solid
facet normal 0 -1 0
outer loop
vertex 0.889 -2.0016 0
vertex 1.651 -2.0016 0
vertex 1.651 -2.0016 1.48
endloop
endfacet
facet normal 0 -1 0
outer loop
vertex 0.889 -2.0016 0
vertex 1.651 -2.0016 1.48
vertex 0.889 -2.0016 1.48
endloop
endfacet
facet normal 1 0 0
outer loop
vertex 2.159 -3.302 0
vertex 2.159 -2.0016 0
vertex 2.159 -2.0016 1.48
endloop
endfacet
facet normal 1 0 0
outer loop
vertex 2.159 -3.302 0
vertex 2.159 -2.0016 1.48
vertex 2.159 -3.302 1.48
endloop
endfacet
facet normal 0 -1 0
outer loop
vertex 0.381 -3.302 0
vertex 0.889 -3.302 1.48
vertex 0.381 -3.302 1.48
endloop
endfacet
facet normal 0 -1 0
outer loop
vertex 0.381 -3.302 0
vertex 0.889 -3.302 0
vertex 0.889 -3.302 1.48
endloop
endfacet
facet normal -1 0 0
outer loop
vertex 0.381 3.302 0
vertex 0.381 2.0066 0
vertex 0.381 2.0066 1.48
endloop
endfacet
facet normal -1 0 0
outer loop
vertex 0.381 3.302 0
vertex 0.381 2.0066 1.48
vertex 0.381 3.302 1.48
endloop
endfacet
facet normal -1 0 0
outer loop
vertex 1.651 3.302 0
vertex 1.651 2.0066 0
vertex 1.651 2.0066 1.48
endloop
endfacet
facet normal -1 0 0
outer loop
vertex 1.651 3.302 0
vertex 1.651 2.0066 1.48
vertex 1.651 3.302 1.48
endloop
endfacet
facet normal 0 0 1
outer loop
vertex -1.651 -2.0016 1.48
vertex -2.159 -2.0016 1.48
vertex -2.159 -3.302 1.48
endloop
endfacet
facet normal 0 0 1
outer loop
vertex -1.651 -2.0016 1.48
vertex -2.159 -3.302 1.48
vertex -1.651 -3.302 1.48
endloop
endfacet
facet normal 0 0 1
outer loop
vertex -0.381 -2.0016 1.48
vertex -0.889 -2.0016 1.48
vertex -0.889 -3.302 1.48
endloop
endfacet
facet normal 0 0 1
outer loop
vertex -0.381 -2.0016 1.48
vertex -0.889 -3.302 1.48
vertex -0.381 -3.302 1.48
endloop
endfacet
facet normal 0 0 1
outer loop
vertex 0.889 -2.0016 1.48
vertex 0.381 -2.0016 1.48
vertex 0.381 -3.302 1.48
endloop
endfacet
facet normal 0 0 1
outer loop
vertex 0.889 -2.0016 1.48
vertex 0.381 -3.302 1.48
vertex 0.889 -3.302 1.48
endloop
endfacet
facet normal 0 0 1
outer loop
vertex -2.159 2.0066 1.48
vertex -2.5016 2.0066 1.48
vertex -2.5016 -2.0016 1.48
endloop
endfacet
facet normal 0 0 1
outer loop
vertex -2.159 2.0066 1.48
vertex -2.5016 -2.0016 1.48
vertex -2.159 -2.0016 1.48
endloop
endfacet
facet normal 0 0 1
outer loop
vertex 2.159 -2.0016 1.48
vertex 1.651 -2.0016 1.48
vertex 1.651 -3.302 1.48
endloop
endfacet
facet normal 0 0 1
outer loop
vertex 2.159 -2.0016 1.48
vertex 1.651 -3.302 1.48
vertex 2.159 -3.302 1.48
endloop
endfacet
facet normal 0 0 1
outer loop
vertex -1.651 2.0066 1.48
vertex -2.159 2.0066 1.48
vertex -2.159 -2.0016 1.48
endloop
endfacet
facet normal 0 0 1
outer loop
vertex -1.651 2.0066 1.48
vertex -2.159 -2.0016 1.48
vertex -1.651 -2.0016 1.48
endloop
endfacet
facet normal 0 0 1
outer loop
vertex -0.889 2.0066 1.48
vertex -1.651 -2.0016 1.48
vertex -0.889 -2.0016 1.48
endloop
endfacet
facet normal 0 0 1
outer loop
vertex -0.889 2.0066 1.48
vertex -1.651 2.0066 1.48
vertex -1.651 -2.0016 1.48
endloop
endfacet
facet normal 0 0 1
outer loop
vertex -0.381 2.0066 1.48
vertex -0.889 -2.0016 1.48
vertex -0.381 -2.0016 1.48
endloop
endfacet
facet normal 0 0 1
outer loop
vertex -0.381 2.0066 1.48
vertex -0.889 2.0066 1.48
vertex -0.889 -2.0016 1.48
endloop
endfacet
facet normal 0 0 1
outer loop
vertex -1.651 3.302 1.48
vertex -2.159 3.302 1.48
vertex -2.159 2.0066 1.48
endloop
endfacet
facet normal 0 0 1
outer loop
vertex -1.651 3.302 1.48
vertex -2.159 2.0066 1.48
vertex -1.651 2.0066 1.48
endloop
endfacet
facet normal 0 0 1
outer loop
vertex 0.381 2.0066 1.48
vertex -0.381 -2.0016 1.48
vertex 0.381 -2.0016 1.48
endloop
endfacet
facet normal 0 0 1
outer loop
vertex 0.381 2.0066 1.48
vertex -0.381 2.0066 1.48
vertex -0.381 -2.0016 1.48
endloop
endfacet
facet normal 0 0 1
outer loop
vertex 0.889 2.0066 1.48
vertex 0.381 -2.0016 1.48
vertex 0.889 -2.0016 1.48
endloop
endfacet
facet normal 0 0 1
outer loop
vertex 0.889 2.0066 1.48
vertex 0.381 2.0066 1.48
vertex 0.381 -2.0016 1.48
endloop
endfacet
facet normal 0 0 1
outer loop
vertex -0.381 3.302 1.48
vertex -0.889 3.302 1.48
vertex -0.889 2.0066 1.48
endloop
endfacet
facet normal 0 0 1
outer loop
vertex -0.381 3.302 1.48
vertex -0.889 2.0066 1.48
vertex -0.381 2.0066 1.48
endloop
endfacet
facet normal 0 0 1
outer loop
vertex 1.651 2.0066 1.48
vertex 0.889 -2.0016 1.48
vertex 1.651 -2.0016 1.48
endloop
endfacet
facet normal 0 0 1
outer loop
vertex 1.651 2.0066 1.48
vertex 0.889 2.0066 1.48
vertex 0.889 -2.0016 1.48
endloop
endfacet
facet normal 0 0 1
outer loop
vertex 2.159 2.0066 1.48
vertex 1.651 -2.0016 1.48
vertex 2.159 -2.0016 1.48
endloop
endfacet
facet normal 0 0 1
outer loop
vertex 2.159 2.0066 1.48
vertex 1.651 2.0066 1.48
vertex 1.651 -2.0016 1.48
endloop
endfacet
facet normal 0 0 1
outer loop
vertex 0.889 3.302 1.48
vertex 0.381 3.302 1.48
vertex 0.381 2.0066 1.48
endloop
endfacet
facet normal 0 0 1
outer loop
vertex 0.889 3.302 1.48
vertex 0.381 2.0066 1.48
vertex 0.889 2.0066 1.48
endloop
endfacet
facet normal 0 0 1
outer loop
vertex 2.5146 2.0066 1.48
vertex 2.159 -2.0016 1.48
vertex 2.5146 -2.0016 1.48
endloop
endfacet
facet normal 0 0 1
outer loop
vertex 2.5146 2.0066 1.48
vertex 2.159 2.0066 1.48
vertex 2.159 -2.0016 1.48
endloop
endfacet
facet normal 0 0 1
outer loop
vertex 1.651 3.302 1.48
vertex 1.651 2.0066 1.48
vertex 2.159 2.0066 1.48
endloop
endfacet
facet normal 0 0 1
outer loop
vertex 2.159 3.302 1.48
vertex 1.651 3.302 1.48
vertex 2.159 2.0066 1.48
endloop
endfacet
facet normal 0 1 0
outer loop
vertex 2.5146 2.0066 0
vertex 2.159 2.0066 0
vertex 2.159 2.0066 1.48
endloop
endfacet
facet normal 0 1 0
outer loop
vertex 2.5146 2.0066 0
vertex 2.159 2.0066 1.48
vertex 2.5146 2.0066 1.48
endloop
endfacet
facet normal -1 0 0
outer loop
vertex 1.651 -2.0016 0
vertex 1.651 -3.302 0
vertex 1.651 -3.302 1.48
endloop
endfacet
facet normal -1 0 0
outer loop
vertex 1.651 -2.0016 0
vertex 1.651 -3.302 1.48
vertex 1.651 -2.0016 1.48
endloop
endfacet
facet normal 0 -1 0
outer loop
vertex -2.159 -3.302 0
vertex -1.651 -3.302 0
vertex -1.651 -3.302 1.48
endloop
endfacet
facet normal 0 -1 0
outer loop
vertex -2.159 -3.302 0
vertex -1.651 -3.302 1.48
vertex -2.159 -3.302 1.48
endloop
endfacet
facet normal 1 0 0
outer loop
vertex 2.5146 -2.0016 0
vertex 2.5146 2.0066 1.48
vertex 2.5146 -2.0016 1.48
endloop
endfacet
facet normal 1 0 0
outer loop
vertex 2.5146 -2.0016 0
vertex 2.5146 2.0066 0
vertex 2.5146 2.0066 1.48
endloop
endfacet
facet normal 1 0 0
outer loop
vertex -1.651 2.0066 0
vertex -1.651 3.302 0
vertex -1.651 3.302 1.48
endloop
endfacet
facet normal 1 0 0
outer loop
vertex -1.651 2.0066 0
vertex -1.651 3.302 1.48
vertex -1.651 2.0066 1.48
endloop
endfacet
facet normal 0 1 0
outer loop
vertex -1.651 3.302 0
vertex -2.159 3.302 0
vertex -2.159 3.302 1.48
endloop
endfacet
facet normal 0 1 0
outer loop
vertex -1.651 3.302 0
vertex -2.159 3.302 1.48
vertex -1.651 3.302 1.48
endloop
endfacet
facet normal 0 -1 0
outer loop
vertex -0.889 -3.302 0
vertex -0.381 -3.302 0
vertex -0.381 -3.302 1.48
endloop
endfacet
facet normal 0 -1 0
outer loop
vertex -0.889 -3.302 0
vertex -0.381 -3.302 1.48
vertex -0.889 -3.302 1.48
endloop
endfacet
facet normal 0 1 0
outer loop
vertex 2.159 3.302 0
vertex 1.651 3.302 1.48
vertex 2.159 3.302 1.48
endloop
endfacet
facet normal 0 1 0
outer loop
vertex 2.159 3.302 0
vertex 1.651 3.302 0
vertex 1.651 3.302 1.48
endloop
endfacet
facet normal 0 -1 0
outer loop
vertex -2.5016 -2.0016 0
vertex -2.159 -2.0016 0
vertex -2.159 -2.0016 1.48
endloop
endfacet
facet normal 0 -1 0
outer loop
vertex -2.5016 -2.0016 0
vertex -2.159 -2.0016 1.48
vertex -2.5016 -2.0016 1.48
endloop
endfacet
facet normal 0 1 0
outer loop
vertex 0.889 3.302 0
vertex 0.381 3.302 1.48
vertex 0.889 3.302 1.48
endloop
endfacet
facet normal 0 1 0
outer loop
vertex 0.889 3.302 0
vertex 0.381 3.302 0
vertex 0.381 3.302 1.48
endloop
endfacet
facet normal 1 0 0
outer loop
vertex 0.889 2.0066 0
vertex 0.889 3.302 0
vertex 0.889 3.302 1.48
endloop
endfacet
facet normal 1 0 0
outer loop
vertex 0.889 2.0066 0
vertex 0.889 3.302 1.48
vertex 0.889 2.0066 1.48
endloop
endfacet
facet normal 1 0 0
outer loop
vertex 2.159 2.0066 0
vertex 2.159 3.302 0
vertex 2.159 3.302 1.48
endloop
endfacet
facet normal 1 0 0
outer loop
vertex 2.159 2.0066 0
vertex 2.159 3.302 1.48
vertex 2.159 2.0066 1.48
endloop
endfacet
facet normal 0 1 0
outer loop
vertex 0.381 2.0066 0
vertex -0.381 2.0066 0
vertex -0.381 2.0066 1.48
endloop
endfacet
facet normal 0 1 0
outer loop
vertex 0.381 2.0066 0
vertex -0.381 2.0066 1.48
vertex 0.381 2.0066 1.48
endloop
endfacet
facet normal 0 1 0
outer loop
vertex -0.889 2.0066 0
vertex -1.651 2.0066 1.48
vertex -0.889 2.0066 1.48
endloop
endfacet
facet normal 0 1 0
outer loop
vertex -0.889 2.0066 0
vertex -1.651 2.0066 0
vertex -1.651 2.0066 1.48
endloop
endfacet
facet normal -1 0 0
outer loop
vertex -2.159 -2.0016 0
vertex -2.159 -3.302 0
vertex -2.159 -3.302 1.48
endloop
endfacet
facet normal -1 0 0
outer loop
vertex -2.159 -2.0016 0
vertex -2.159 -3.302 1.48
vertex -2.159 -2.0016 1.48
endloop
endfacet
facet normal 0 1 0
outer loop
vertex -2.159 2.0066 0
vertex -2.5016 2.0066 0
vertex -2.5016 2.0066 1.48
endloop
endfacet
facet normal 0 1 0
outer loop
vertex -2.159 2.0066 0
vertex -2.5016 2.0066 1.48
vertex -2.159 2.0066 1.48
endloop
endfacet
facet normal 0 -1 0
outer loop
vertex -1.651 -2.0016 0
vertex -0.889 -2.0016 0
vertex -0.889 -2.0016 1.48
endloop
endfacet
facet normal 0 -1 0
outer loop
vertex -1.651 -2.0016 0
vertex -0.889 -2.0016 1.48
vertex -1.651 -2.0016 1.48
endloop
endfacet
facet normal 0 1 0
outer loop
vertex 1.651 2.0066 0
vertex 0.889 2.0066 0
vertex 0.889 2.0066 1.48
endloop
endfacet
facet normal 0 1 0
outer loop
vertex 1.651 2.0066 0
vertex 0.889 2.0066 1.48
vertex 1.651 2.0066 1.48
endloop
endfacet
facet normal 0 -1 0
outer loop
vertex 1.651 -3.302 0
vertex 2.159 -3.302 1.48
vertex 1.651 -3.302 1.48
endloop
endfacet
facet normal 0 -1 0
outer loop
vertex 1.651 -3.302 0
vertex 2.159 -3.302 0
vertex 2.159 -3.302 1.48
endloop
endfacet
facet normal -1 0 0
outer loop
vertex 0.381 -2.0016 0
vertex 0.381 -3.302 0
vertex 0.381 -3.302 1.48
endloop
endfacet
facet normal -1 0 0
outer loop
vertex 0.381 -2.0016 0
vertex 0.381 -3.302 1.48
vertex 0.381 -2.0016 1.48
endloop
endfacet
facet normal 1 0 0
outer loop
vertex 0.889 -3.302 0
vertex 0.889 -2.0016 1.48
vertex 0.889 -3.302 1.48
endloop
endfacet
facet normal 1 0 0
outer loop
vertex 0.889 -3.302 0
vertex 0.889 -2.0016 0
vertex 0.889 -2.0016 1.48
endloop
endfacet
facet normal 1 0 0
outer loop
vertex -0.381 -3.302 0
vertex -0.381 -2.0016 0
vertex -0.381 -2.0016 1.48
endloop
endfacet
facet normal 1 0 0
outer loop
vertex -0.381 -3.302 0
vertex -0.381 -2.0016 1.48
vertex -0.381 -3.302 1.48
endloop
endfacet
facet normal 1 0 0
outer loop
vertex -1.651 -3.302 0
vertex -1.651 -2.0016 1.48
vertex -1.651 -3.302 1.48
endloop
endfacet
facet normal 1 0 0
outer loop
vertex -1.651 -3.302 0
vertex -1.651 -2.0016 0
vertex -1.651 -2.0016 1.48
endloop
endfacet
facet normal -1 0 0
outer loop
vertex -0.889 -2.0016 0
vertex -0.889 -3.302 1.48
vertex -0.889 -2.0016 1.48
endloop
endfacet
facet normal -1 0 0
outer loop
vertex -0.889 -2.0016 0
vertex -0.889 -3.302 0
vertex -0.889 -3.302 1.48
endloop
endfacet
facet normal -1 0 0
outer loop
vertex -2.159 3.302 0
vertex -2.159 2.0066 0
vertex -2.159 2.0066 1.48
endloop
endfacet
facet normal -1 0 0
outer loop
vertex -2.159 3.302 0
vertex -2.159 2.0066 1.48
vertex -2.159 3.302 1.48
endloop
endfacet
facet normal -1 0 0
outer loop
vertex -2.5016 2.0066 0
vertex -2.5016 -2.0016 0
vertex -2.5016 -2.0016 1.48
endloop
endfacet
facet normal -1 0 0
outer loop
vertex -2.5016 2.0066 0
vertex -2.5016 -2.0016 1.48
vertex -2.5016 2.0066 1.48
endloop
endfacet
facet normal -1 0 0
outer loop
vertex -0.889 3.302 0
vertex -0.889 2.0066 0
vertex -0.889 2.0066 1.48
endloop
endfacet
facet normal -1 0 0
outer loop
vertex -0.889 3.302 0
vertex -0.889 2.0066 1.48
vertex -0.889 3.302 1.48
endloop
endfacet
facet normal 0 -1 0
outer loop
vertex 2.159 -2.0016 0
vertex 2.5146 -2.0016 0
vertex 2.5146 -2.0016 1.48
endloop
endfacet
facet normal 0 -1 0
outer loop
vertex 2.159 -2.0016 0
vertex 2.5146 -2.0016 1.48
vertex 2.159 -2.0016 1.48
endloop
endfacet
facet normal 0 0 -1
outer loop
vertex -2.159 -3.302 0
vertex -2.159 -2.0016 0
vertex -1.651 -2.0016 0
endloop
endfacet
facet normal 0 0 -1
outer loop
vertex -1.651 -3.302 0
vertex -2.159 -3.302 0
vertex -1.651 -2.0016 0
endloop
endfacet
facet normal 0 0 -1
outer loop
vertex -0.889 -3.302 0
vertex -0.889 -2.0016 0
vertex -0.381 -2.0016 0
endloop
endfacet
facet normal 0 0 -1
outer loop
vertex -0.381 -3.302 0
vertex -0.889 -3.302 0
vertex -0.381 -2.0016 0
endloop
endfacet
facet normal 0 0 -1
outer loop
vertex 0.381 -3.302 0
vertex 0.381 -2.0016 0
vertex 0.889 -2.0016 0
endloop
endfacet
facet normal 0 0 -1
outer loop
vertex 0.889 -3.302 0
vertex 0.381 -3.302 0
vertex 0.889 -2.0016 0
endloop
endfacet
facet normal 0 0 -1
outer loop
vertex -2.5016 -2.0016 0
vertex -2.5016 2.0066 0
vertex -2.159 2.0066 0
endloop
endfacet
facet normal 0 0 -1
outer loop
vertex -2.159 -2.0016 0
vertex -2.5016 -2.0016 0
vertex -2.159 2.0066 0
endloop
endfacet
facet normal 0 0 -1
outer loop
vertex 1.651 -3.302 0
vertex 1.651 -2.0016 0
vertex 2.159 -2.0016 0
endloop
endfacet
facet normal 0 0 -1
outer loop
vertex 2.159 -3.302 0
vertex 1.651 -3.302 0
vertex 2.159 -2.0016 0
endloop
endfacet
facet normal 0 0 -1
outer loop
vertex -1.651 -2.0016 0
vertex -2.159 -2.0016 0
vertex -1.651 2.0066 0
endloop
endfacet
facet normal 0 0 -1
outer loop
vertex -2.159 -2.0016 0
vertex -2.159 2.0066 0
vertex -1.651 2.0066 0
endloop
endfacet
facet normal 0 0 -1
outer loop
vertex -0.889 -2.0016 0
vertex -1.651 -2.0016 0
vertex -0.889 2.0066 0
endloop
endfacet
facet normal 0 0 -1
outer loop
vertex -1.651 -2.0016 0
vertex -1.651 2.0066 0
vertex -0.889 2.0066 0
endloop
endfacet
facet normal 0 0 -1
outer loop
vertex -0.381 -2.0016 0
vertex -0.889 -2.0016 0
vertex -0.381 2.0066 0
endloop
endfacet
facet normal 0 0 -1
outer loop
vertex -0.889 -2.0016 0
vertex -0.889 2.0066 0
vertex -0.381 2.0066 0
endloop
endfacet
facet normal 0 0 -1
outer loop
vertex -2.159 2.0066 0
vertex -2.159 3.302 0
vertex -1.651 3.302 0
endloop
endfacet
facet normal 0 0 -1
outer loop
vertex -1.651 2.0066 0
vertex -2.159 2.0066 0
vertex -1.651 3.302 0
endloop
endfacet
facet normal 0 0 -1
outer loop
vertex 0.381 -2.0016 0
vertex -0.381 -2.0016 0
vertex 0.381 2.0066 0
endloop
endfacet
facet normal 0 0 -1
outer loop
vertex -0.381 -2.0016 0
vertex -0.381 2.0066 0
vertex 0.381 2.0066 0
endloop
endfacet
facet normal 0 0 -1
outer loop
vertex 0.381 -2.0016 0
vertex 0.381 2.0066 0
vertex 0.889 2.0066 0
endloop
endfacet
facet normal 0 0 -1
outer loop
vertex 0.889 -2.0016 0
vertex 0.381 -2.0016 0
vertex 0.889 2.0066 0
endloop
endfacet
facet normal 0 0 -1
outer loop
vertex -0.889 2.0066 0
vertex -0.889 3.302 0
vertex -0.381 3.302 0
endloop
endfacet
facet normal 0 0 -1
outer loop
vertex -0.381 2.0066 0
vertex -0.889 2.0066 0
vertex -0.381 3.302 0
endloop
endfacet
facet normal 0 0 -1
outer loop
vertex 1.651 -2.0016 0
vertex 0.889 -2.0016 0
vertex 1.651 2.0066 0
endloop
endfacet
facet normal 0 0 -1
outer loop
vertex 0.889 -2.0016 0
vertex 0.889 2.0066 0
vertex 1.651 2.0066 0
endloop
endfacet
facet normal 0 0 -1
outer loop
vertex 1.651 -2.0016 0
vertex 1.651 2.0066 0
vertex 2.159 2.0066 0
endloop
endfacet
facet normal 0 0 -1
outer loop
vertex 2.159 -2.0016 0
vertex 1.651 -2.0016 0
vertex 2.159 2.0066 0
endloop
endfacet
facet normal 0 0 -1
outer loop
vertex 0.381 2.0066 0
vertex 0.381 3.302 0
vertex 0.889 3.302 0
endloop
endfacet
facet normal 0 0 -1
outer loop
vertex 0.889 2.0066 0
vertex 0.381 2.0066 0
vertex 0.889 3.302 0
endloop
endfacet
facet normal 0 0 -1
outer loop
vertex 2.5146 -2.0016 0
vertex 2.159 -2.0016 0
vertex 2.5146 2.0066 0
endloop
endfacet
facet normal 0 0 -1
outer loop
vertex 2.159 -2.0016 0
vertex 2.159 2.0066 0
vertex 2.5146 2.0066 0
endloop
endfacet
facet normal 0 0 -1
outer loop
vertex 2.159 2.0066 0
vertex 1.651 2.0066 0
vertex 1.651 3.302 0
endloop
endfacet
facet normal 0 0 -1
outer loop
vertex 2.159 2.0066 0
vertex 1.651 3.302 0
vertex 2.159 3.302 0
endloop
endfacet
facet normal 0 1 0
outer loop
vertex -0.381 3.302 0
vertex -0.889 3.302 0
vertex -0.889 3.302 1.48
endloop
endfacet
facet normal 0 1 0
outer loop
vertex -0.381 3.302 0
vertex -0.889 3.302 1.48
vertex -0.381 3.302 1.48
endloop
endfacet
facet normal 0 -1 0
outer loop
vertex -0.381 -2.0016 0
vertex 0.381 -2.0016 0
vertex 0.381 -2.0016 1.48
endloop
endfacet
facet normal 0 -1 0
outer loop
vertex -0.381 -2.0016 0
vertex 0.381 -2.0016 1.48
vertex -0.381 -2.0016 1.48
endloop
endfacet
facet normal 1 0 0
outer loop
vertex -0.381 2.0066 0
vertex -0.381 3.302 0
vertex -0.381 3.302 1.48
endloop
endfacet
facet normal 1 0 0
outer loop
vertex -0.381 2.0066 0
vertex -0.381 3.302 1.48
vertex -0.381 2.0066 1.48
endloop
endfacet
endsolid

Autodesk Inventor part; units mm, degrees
ref_plane "YZ Plane" through (0, 0, 0) normal (1, 0, 0) x (0, 1, 0)
ref_plane "XZ Plane" through (0, 0, 0) normal (0, 1, 0) x (-1, 0, 0)
ref_plane "XY Plane" through (0, 0, 0) normal (0, 0, 1) x (1, 0, 0)
sketch "NCV8402AD-SOIC8, NCV8402AD_162" plane through (0, 0, 0) normal (0, 0, 1) x (1, 0, 0)
  line L0 (-2.159, 2.0066) -> (-2.159, 3.302)
  line L1 (-2.159, 3.302) -> (-1.651, 3.302)
  line L2 (-1.651, 3.302) -> (-1.651, 2.0066)
  line L3 (-1.651, 2.0066) -> (-0.889, 2.0066)
  line L4 (-0.889, 2.0066) -> (-0.889, 3.302)
  line L5 (-0.889, 3.302) -> (-0.381, 3.302)
  line L6 (-0.381, 3.302) -> (-0.381, 2.0066)
  line L7 (-0.381, 2.0066) -> (0.381, 2.0066)
  line L8 (0.381, 2.0066) -> (0.381, 3.302)
  line L9 (0.381, 3.302) -> (0.889, 3.302)
  line L10 (0.889, 3.302) -> (0.889, 2.0066)
  line L11 (0.889, 2.0066) -> (1.651, 2.0066)
  line L12 (1.651, 2.0066) -> (1.651, 3.302)
  line L13 (1.651, 3.302) -> (2.159, 3.302)
  line L14 (2.159, 3.302) -> (2.159, 2.0066)
  line L15 (2.159, 2.0066) -> (2.5146, 2.0066)
  line L16 (2.5146, 2.0066) -> (2.5146, -2.0016)
  line L17 (2.5146, -2.0016) -> (2.159, -2.0016)
  line L18 (2.159, -2.0016) -> (2.159, -3.302)
  line L19 (2.159, -3.302) -> (1.651, -3.302)
  line L20 (1.651, -3.302) -> (1.651, -2.0016)
  line L21 (1.651, -2.0016) -> (0.889, -2.0016)
  line L22 (0.889, -2.0016) -> (0.889, -3.302)
  line L23 (0.889, -3.302) -> (0.381, -3.302)
  line L24 (0.381, -3.302) -> (0.381, -2.0016)
  line L25 (0.381, -2.0016) -> (-0.381, -2.0016)
  line L26 (-0.381, -2.0016) -> (-0.381, -3.302)
  line L27 (-0.381, -3.302) -> (-0.889, -3.302)
  line L28 (-0.889, -3.302) -> (-0.889, -2.0016)
  line L29 (-0.889, -2.0016) -> (-1.651, -2.0016)
  line L30 (-1.651, -2.0016) -> (-1.651, -3.302)
  line L31 (-1.651, -3.302) -> (-2.159, -3.302)
  line L32 (-2.159, -3.302) -> (-2.159, -2.0016)
  line L33 (-2.159, -2.0016) -> (-2.5016, -2.0016)
  line L34 (-2.5016, -2.0016) -> (-2.5016, 2.0066)
  line L35 (-2.5016, 2.0066) -> (-2.159, 2.0066)
extrude "Extrusion1" add sketch "NCV8402AD-SOIC8, NCV8402AD_162" along normal blind 1.48
properties part number "NCV8402AD"
